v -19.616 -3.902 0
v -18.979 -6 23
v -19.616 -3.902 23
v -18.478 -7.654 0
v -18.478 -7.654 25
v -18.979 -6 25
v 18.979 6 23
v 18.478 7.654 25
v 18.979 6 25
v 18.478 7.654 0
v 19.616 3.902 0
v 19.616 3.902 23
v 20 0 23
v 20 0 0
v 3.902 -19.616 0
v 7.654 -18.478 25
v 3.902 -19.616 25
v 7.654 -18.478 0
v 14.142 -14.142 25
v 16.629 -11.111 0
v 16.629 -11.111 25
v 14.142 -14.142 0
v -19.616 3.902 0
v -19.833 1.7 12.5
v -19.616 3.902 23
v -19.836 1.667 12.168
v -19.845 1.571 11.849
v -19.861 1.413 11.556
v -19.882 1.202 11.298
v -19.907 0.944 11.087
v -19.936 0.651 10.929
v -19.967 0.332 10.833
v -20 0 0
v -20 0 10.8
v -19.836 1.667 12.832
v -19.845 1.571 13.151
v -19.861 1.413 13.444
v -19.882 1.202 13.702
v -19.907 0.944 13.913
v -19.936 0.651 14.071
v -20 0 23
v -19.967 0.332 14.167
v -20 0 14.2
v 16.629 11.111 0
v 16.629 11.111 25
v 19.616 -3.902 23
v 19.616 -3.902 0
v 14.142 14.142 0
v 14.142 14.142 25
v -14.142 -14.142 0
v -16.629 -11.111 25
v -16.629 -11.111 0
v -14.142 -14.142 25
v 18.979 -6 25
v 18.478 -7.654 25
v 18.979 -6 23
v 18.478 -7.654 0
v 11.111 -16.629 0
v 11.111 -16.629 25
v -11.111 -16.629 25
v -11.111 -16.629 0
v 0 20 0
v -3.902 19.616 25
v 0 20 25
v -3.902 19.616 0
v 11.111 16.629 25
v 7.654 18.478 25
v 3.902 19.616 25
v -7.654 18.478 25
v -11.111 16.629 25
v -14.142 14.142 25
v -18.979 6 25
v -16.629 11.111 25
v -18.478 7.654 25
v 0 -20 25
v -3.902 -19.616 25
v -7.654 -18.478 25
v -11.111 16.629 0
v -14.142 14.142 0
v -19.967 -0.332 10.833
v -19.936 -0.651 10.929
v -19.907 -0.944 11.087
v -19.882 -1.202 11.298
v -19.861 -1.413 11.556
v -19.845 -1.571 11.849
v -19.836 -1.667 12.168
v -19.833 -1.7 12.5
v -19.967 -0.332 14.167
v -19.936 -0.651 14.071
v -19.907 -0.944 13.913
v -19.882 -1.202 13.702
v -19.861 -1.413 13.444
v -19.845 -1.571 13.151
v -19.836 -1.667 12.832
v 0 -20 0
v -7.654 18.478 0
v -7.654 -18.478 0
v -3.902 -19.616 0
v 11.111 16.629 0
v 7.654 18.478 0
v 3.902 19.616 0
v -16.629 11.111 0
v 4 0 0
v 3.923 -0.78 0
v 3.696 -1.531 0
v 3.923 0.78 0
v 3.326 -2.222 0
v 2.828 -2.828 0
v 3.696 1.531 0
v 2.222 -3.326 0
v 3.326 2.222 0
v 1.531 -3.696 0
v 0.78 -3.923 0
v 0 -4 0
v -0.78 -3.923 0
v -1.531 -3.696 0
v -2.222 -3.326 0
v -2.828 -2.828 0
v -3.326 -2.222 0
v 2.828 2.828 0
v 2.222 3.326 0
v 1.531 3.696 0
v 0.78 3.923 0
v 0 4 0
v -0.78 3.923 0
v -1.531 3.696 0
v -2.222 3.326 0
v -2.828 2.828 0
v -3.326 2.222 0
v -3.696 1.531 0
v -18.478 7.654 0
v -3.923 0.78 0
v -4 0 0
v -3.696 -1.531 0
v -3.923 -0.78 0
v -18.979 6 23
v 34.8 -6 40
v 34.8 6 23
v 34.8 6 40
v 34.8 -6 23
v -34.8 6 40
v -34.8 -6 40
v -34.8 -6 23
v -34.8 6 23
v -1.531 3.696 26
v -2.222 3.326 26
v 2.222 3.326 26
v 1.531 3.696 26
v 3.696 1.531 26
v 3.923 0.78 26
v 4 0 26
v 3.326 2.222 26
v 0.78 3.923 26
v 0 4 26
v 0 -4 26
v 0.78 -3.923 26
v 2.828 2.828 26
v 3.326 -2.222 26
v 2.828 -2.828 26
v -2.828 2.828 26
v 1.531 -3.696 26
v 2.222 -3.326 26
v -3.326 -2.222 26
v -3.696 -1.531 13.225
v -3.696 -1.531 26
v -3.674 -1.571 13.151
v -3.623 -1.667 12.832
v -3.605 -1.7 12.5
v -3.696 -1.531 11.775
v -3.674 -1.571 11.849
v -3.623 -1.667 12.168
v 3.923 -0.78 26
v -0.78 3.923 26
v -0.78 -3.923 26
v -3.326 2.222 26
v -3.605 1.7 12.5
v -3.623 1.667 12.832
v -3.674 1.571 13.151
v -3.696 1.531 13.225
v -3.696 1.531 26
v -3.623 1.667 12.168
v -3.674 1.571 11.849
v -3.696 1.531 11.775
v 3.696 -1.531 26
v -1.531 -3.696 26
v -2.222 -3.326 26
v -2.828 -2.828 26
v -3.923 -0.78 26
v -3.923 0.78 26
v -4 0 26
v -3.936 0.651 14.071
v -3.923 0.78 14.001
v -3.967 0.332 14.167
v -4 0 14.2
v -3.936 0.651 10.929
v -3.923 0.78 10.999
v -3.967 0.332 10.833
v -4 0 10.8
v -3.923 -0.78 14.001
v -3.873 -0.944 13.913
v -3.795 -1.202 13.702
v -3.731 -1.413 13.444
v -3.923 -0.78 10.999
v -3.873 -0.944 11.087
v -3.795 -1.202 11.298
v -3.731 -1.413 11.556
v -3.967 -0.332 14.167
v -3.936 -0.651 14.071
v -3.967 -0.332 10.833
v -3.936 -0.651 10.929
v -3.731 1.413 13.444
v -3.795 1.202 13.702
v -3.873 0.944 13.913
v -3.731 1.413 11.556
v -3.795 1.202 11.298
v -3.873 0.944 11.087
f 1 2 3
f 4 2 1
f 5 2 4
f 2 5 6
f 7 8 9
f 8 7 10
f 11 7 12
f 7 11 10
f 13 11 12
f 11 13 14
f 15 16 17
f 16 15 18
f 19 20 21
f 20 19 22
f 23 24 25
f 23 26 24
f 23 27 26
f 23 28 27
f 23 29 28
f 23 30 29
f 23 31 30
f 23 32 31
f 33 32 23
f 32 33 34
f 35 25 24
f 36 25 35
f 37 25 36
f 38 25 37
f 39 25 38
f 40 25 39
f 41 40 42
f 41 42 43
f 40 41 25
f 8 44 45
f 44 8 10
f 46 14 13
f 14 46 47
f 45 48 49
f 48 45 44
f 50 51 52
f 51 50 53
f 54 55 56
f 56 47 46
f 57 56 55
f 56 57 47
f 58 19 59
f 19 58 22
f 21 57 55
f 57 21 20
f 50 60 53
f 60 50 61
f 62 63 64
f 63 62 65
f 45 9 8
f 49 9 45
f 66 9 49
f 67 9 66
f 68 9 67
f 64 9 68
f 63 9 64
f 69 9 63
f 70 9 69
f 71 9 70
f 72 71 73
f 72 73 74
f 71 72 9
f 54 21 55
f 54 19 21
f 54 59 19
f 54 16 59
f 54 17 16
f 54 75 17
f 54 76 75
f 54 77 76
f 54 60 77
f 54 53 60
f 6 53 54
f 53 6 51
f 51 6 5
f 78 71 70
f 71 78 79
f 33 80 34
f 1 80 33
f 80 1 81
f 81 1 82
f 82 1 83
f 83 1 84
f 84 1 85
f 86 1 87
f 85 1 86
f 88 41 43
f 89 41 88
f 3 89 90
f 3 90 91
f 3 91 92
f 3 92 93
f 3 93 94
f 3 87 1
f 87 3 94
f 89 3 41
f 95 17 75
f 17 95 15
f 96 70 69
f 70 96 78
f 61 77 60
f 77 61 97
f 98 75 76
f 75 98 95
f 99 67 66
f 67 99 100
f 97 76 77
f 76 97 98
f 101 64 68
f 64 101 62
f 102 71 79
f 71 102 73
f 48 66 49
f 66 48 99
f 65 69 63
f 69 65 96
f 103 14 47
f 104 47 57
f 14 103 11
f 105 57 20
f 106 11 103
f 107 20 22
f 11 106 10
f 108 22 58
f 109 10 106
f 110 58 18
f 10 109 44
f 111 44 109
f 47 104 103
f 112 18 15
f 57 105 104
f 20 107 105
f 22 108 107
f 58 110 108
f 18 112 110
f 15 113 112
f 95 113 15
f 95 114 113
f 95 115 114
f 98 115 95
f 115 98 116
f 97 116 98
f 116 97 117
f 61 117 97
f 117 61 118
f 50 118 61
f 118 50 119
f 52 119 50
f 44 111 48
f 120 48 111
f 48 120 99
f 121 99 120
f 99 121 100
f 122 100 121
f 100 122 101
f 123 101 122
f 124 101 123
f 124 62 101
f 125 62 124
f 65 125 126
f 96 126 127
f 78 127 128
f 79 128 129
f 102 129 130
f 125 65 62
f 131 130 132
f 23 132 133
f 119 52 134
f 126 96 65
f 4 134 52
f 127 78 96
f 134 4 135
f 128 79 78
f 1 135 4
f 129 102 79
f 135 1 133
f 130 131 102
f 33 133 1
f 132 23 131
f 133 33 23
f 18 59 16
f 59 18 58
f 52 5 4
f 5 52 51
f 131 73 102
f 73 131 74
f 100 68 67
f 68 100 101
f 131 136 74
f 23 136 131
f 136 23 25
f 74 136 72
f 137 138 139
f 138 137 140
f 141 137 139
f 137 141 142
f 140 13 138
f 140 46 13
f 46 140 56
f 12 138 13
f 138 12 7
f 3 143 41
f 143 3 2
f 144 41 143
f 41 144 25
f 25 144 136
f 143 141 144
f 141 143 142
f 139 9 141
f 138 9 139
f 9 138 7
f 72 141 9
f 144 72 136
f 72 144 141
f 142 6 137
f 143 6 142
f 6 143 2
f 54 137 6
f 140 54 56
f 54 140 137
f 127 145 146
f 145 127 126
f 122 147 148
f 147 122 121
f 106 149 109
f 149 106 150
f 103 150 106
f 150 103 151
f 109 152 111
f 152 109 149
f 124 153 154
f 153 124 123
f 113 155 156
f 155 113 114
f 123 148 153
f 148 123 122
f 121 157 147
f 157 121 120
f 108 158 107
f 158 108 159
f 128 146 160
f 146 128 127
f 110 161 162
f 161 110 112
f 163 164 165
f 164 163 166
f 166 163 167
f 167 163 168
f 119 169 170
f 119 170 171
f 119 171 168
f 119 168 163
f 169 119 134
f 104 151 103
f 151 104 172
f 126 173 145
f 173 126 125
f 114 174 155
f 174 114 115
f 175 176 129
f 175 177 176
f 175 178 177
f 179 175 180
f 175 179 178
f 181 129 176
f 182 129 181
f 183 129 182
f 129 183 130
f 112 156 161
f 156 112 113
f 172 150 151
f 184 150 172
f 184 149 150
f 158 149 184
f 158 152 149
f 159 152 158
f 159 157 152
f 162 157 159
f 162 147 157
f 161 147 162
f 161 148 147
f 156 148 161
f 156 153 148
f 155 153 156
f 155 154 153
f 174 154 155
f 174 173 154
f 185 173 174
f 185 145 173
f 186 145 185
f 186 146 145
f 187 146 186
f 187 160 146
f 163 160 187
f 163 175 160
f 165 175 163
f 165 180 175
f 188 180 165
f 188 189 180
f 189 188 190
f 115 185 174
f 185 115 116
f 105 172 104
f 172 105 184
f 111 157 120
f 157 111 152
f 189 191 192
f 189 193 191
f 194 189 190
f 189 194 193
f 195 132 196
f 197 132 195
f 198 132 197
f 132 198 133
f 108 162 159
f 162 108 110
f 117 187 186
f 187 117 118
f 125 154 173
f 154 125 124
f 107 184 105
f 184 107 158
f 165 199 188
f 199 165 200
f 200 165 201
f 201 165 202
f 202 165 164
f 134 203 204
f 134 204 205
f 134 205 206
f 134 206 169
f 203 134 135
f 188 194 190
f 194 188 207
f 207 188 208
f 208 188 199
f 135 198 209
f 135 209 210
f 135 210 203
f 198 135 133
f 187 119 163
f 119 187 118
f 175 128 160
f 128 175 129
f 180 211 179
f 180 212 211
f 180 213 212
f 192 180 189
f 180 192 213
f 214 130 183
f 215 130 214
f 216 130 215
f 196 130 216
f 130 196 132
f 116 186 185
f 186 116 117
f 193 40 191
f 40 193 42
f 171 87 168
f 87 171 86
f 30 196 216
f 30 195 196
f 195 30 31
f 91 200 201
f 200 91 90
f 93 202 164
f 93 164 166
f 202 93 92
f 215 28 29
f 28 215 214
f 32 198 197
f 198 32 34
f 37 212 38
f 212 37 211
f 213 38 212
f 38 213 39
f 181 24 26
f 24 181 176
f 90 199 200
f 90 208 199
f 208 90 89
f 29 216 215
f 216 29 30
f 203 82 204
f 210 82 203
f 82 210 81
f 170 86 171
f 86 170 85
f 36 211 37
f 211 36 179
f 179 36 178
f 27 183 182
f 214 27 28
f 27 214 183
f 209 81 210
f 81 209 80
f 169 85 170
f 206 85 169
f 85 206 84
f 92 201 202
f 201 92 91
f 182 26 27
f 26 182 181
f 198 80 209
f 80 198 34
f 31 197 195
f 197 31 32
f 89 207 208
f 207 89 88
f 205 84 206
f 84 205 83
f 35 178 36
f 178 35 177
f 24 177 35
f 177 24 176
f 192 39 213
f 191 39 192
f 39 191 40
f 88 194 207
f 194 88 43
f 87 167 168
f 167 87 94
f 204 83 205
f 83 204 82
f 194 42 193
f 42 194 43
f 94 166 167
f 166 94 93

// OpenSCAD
$fn = 32;

// ----------------------------------------------------------------------
// Hand knob: 40 x 69.6 x 25 mm
// ----------------------------------------------------------------------

// --- parameters (mm) ---
knob_d = 40;              // knob diameter
knob_h = 25;              // knob height
bore_d = 8;               // shaft bore
set_d = 3.4;              // set screw tap hole
wing_l = 69.6;            // wing span
wing_w = 12;              // wing width
wing_h = 15;              // wing thickness

module body() {
  cylinder(h = knob_h, d = knob_d);
}

module wing() {
  /* wing sunk 2 mm into the knob so the joint overlaps */
  translate([-wing_l / 2, -wing_w / 2, knob_h - 2])
    cube([wing_l, wing_w, wing_h + 2]);
}

difference() {
  union() {
    body();
    wing();
  }
  translate([0, 0, -1]) cylinder(h = knob_h + 0 + 2, d = bore_d);
  translate([-knob_d / 2 - 1, 0, knob_h * 0.5]) rotate([0, 90, 0]) cylinder(h = knob_d / 2 + 2, d = set_d);
}
